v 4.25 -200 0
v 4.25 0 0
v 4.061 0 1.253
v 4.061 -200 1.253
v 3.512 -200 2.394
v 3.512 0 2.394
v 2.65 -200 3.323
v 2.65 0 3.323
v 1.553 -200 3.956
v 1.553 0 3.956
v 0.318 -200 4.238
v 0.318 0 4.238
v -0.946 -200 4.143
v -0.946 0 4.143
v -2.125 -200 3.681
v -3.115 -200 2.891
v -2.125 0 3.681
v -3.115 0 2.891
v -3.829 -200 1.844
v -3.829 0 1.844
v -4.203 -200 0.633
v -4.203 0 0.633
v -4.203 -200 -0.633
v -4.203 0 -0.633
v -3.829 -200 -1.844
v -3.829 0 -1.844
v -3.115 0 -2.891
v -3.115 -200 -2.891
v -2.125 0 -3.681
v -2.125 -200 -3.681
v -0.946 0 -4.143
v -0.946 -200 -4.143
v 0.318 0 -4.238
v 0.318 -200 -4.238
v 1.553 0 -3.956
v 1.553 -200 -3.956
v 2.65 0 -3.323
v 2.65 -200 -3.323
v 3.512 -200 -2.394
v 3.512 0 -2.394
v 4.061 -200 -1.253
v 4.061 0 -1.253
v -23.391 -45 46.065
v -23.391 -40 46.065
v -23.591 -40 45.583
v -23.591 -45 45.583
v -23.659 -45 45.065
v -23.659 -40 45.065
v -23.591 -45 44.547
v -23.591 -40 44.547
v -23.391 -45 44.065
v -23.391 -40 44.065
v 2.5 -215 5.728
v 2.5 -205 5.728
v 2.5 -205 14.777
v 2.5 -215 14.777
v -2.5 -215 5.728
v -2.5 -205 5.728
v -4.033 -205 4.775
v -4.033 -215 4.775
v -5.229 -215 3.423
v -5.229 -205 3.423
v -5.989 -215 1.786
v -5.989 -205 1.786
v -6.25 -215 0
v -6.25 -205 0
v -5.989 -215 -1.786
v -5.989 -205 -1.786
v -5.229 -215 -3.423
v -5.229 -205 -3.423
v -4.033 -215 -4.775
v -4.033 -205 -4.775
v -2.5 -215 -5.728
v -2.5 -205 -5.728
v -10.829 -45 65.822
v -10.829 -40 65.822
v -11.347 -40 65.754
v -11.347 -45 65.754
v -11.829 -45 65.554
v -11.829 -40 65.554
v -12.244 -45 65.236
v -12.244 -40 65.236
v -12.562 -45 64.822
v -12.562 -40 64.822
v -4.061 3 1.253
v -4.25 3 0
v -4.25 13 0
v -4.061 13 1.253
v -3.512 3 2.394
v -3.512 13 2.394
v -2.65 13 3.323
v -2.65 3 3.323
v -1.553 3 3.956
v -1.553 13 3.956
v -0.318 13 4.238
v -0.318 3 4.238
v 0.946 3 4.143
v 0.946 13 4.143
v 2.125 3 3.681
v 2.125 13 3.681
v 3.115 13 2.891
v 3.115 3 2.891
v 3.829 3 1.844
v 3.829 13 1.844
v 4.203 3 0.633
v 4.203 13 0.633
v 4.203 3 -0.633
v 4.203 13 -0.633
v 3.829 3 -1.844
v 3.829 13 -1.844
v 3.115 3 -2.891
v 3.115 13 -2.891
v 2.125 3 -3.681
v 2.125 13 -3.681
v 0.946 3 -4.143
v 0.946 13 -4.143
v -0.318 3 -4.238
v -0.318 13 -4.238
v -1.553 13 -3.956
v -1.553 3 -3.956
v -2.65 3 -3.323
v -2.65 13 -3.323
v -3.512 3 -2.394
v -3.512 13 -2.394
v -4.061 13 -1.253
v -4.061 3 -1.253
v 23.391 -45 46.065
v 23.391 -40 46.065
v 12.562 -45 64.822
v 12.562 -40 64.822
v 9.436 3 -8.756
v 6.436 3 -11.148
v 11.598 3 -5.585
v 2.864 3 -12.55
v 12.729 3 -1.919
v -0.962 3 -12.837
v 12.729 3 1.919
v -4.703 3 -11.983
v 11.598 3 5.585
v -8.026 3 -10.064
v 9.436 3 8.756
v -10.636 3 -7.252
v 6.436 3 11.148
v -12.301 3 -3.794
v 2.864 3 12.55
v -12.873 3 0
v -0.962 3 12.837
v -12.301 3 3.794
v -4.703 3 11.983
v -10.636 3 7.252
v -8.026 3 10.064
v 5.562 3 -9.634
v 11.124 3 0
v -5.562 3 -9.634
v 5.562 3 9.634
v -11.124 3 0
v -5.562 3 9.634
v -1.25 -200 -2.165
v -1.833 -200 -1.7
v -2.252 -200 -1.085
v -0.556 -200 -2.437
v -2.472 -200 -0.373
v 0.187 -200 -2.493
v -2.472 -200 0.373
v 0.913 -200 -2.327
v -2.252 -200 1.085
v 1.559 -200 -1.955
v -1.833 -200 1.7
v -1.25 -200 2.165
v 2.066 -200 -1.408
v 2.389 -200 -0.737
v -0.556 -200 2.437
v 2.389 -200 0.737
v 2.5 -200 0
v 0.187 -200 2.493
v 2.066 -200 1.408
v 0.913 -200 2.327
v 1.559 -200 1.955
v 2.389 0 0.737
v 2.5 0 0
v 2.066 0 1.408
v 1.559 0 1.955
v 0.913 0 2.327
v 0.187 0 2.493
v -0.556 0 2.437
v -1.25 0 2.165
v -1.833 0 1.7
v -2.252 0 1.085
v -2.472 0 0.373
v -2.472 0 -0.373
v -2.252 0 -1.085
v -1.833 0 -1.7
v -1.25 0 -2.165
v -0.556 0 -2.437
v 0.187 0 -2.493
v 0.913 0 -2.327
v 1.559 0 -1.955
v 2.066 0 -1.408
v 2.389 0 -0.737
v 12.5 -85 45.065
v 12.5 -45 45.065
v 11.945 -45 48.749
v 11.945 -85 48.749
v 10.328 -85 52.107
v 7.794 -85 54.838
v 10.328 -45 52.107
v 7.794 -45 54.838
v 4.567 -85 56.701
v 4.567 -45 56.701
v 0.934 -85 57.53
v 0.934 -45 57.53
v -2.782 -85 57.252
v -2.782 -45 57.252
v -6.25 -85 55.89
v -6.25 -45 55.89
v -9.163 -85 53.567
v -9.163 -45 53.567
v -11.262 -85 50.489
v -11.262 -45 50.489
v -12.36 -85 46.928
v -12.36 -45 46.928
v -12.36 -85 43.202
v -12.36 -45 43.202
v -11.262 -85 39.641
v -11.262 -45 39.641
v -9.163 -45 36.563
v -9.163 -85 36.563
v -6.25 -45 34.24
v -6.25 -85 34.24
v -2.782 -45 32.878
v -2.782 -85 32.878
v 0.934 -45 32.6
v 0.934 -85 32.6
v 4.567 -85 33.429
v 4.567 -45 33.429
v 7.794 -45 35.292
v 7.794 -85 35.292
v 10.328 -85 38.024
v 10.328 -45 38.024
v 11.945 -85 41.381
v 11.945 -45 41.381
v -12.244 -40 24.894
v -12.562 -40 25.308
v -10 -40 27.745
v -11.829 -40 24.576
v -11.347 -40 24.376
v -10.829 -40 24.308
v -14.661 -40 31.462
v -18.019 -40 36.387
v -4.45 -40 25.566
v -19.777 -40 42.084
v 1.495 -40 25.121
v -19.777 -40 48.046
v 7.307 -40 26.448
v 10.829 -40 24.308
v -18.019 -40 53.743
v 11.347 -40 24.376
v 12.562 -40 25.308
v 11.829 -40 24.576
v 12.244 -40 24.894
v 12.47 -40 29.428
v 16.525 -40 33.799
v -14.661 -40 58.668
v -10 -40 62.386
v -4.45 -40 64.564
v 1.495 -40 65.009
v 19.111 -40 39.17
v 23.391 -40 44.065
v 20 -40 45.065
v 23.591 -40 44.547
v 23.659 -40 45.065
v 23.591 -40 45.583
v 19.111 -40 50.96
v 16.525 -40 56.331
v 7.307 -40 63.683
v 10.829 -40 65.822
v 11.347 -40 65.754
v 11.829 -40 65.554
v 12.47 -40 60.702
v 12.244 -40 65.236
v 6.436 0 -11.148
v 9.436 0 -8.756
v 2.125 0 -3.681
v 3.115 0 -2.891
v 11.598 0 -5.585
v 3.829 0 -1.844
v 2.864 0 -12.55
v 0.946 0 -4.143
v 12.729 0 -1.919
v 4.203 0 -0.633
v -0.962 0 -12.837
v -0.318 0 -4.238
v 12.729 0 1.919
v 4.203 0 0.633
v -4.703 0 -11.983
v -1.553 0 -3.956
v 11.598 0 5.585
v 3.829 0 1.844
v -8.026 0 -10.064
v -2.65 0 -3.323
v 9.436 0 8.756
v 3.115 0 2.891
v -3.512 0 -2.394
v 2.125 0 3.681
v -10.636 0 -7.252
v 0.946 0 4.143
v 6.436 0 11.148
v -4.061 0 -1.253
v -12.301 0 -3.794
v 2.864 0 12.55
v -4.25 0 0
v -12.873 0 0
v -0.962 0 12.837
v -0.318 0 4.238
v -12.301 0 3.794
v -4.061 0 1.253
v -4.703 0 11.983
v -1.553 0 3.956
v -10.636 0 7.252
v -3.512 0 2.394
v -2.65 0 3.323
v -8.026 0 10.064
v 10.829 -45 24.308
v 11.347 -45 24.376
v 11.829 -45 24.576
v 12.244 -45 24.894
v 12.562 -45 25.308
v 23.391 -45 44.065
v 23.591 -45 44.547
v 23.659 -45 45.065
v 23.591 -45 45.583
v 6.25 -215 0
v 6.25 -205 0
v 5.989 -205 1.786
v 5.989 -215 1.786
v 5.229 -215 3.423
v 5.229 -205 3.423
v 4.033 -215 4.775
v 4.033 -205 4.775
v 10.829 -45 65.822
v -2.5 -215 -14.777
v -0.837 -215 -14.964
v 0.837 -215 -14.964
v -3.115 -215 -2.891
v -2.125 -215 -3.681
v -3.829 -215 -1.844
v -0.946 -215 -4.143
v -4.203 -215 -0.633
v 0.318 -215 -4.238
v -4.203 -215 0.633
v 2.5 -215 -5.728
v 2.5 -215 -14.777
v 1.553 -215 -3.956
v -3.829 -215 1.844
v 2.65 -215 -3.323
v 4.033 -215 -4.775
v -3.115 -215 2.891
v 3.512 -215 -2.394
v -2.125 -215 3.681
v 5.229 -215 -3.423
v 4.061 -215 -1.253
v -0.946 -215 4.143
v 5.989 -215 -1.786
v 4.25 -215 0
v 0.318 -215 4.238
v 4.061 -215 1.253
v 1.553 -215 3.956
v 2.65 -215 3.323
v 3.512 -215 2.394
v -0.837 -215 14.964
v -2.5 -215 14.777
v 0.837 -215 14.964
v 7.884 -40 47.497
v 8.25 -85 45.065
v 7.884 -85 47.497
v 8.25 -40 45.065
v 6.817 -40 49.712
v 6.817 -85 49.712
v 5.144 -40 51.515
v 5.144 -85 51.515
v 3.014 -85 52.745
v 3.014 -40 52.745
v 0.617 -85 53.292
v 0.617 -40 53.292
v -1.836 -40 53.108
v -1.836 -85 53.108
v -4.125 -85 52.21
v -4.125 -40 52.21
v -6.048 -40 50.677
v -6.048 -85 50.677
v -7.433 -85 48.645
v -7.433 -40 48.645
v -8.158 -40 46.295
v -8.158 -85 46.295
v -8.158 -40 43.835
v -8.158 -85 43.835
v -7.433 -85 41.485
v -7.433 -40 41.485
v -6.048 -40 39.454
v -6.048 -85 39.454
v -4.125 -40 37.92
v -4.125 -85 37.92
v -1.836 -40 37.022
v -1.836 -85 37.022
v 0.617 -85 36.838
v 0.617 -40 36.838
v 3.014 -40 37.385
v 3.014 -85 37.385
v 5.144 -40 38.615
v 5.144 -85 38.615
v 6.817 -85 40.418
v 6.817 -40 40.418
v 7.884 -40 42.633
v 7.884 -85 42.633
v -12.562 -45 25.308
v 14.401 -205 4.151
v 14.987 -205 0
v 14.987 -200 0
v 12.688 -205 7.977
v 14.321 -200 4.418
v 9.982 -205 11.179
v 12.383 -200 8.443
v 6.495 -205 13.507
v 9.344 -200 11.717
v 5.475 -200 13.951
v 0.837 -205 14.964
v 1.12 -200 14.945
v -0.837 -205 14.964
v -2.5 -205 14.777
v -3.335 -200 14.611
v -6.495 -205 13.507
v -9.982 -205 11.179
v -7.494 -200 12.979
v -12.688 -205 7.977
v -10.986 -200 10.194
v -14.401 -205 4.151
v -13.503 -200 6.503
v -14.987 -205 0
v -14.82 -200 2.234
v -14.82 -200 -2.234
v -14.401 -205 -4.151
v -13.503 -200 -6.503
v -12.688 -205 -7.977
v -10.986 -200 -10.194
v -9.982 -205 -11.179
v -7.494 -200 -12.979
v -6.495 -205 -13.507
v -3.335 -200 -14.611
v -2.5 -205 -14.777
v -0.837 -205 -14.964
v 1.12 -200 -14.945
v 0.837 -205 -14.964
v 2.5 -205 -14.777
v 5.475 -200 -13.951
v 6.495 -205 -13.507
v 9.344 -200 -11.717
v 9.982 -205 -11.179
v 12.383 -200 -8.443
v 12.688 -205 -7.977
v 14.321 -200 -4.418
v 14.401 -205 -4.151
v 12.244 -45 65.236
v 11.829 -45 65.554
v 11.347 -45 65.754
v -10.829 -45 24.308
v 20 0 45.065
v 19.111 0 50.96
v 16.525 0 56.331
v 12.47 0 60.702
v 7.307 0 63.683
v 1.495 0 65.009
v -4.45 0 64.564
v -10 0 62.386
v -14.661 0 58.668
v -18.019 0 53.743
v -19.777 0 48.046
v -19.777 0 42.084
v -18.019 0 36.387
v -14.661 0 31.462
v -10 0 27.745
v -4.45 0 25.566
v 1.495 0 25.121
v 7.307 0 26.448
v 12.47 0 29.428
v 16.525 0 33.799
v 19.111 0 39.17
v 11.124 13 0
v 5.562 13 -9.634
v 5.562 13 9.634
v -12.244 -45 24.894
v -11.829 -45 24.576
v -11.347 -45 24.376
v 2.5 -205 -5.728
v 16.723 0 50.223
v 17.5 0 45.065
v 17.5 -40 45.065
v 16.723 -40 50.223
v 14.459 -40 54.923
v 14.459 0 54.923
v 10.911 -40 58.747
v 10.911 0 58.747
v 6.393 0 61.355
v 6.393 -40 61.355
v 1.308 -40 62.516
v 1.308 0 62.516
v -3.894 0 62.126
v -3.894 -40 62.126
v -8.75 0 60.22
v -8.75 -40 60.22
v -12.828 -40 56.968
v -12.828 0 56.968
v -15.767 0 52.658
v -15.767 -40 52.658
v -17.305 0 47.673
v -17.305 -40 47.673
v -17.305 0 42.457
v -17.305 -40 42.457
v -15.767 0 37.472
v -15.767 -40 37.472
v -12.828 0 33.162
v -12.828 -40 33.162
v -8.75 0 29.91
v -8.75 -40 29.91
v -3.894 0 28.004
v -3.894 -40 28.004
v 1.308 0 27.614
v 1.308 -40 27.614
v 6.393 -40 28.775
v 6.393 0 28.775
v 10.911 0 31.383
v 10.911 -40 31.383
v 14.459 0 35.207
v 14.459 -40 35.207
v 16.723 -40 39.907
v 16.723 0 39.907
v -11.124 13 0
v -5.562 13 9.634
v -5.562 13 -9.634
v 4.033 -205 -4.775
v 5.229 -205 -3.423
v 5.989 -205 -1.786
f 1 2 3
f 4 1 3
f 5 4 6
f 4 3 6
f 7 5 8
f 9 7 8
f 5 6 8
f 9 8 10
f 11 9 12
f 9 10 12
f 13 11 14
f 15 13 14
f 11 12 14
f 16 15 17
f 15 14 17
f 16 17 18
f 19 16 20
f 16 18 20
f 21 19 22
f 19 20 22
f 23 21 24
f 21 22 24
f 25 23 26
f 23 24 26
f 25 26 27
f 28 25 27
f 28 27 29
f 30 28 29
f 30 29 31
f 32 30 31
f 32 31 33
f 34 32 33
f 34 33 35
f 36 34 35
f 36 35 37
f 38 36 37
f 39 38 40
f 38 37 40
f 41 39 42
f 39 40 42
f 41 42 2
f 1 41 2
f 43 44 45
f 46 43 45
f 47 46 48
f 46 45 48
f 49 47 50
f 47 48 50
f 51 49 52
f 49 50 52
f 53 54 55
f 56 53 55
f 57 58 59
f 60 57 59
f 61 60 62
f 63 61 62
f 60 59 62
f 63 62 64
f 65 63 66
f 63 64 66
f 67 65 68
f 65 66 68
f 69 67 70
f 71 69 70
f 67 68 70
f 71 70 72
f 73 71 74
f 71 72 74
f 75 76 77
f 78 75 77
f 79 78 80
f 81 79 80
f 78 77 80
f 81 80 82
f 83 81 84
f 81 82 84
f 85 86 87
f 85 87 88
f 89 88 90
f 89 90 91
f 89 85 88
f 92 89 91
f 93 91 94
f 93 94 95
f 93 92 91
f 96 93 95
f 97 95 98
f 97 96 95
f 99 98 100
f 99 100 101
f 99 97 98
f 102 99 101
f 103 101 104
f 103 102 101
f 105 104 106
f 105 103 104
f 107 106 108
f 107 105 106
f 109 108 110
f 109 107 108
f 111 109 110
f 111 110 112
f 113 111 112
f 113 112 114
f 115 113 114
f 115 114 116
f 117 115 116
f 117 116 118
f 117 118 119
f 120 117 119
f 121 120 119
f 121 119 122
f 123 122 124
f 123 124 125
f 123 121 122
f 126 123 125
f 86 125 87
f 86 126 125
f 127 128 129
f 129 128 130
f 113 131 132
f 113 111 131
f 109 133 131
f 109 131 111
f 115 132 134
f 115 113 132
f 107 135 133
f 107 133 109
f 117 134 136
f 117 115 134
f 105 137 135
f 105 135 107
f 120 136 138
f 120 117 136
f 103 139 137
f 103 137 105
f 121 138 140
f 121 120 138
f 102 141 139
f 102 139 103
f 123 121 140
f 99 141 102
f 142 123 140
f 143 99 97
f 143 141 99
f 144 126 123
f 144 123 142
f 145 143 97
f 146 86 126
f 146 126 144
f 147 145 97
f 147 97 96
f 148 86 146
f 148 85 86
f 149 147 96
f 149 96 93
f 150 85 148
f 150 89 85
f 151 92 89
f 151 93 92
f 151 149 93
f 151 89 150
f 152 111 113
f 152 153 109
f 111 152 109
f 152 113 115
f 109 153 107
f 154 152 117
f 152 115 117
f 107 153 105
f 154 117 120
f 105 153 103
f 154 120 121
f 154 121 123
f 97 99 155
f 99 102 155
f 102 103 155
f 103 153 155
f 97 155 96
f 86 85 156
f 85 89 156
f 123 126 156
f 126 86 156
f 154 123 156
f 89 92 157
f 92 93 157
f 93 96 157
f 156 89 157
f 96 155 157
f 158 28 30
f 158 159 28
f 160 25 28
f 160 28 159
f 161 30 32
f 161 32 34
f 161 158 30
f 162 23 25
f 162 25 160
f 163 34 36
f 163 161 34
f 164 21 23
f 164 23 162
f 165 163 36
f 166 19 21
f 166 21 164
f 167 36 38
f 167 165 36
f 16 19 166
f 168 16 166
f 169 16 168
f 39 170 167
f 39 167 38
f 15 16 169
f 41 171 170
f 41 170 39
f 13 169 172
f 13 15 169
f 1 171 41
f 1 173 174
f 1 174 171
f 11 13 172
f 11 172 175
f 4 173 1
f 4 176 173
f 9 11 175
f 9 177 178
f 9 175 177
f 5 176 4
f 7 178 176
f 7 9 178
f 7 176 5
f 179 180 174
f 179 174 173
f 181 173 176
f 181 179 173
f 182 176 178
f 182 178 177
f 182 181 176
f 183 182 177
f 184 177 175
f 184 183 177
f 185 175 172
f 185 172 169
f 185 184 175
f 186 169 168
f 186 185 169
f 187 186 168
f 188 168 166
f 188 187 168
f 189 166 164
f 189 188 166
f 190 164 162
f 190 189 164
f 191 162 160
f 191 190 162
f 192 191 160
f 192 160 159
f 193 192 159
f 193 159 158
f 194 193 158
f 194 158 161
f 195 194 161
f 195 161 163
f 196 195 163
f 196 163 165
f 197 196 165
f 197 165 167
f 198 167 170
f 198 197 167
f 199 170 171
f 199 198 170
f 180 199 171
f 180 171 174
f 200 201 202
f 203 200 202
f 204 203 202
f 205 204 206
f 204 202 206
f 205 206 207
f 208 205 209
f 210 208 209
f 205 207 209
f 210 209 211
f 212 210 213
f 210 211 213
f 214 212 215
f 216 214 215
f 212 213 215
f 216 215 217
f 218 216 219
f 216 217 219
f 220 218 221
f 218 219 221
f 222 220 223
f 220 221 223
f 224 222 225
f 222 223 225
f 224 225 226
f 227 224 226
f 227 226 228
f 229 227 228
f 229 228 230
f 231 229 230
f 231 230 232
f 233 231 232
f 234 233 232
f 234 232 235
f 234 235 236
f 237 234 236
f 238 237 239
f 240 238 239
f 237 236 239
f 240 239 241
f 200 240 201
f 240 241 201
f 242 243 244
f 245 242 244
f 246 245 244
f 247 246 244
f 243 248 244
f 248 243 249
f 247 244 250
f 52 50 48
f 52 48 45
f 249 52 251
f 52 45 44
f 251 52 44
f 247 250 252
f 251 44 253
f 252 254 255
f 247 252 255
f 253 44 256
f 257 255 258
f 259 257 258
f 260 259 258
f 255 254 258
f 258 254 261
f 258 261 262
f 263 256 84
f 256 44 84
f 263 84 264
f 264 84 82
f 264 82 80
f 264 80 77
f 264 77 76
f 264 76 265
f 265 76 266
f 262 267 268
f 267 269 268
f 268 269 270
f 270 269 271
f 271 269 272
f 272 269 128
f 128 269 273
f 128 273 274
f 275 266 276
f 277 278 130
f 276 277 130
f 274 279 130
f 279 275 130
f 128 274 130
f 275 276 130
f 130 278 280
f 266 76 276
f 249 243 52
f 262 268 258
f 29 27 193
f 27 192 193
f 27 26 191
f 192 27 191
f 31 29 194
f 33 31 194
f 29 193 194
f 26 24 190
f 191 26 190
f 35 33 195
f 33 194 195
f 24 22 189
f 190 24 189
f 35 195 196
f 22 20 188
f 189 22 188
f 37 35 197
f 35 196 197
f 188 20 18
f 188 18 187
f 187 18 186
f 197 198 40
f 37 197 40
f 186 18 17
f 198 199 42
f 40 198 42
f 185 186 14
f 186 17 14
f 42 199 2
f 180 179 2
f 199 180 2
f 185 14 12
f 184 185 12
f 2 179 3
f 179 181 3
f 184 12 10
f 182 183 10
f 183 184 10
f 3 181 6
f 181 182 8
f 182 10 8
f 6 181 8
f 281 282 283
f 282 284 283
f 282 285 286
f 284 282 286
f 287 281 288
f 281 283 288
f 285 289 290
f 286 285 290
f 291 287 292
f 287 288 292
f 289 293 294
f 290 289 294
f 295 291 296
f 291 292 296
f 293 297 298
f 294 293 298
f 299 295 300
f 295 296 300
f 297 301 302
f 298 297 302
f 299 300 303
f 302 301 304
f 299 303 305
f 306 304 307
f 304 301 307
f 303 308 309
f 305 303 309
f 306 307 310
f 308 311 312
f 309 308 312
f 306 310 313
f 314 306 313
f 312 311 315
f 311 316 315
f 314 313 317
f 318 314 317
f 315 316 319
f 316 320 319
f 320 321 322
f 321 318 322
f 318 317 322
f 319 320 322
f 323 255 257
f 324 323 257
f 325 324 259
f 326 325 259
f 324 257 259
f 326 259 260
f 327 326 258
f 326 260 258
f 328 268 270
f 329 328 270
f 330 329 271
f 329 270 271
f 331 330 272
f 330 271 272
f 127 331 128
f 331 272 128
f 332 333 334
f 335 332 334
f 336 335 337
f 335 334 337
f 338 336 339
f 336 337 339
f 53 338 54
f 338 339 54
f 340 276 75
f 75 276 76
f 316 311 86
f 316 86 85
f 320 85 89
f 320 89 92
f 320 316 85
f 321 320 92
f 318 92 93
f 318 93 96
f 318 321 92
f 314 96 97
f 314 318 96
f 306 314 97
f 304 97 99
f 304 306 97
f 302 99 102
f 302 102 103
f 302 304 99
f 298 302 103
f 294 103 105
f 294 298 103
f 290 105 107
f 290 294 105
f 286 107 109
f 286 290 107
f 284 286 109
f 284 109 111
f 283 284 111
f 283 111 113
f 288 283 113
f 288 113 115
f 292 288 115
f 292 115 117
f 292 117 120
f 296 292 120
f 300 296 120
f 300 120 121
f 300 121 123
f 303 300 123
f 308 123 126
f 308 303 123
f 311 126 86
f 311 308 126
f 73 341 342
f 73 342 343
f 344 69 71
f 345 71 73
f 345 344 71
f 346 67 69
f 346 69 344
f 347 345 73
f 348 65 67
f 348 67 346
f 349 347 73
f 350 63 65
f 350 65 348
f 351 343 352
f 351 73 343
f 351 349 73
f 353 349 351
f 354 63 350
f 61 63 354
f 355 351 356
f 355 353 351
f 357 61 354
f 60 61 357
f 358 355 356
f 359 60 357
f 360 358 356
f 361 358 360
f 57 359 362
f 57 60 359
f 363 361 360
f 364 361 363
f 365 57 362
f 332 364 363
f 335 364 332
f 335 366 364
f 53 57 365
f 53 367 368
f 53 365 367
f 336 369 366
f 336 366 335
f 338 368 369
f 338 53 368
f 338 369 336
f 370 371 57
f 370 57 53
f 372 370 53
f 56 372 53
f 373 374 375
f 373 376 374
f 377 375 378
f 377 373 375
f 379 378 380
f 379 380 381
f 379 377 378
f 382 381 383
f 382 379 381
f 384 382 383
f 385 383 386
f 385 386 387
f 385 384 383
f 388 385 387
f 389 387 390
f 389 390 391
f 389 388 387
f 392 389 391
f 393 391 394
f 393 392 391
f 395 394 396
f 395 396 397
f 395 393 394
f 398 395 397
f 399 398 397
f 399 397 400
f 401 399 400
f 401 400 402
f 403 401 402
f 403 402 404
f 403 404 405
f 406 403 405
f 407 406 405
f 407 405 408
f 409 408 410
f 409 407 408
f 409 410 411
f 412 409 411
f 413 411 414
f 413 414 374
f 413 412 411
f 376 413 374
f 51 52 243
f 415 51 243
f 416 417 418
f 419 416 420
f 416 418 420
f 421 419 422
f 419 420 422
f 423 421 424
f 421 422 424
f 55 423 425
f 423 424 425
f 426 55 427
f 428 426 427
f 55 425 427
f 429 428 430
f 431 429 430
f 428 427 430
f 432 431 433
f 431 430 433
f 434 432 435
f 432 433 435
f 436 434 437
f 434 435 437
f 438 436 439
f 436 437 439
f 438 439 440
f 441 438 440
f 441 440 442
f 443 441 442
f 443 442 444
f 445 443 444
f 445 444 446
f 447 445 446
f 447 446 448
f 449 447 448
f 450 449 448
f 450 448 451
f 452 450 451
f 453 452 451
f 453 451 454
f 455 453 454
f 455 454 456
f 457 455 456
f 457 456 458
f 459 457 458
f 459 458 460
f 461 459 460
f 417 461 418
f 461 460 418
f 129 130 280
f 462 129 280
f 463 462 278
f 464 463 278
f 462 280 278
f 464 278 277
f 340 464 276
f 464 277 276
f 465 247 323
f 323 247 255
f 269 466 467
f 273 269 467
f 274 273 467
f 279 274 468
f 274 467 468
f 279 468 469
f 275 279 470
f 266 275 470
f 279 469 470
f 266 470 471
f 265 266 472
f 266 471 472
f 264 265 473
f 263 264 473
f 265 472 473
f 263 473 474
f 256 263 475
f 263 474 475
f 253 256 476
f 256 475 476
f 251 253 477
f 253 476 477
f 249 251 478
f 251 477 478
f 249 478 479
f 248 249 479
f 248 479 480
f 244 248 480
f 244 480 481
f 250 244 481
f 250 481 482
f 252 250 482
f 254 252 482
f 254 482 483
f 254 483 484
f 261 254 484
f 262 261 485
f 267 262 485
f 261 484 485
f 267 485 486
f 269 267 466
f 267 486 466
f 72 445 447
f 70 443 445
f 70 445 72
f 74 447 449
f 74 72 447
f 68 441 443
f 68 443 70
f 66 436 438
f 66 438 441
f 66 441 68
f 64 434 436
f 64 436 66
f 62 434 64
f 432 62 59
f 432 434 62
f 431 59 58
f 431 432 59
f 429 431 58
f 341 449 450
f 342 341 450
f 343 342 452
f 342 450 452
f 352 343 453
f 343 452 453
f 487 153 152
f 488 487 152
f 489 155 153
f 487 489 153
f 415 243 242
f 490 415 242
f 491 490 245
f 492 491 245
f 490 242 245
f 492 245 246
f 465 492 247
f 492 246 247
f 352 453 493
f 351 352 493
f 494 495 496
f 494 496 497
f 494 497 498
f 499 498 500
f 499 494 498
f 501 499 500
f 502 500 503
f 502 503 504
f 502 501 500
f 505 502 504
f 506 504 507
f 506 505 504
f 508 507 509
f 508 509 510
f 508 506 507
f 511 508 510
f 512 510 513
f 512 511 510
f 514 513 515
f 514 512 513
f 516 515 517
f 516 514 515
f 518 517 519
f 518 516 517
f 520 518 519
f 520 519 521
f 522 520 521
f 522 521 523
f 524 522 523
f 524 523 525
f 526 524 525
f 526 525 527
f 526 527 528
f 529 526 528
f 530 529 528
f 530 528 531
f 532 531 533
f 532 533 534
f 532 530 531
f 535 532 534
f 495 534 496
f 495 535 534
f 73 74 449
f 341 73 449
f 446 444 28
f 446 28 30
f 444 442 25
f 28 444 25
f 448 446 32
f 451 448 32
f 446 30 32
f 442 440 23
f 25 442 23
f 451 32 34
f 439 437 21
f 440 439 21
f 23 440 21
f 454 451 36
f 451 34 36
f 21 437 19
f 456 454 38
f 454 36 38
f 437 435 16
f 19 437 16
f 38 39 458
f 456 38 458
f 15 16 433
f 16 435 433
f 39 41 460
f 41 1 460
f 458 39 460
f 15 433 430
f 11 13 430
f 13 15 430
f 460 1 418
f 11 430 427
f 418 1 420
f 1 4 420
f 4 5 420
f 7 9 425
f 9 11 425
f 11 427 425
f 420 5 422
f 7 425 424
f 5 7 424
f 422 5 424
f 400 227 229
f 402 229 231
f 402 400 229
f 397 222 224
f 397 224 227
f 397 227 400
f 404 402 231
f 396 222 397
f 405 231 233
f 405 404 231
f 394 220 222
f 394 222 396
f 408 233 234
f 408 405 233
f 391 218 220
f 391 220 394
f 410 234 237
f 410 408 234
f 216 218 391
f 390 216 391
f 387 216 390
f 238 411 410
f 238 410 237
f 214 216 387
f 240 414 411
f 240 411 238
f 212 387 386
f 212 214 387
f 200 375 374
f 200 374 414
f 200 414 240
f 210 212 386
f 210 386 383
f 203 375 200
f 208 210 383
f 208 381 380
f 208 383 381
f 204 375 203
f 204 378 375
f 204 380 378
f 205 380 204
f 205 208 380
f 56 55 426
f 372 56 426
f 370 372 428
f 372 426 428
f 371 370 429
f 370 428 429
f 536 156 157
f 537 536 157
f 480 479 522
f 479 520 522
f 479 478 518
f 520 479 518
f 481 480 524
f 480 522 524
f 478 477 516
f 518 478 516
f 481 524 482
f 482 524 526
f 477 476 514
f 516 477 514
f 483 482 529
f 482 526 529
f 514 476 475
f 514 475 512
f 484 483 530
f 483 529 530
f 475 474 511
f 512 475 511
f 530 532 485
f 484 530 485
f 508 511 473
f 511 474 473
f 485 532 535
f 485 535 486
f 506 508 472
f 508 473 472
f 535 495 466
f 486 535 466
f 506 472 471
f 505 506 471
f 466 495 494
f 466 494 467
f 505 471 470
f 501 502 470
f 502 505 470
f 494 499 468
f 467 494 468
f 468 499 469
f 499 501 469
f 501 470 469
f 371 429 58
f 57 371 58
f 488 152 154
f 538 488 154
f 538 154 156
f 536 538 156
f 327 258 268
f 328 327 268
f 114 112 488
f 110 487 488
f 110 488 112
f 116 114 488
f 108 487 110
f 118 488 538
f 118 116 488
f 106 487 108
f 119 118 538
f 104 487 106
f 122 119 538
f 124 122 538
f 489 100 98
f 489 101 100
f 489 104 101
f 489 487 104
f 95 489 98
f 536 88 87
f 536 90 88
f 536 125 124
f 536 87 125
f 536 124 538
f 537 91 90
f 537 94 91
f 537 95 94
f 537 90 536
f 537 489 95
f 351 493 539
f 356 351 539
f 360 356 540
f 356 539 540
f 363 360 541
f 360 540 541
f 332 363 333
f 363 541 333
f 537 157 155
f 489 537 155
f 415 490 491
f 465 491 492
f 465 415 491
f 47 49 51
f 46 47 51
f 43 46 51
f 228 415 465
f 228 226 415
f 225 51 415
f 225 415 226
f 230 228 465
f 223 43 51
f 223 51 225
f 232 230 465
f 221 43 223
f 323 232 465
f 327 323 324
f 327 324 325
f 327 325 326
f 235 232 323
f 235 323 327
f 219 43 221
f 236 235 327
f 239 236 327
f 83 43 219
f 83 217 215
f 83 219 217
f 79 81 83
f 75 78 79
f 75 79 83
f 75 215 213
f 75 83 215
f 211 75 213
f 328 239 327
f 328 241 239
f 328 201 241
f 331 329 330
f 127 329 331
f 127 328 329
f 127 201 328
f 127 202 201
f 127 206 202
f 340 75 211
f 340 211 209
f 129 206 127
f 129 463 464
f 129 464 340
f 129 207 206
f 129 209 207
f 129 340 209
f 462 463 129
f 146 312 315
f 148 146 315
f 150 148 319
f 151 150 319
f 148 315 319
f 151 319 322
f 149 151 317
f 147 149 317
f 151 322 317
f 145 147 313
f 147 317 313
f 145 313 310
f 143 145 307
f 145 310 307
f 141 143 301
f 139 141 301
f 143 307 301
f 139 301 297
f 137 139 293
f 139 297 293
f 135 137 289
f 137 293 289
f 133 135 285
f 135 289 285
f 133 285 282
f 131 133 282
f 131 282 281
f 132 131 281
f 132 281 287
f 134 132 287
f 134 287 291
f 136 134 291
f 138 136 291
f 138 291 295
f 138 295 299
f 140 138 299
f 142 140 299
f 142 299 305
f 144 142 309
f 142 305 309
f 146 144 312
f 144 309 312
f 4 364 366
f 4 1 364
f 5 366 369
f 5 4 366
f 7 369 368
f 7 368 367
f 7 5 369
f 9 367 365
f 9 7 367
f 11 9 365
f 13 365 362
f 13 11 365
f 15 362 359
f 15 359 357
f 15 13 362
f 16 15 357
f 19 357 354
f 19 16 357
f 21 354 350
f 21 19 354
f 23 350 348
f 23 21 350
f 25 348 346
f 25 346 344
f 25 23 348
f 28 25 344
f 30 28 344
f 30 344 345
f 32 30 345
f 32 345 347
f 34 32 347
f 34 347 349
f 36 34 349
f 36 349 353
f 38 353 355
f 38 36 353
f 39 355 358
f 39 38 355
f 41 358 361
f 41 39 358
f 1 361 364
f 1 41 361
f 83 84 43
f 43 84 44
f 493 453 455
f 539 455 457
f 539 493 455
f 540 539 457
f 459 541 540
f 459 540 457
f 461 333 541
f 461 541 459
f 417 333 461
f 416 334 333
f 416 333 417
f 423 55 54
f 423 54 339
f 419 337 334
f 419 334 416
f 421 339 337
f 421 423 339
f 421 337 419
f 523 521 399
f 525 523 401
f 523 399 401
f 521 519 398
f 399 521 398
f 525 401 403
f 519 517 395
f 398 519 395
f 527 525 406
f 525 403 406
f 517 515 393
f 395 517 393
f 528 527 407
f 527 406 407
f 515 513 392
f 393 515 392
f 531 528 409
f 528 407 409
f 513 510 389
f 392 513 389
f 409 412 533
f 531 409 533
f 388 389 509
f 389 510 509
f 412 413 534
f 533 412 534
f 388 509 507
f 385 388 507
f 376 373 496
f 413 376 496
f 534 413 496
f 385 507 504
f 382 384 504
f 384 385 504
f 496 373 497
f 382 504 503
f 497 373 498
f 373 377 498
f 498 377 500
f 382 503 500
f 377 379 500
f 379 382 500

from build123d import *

# Parameters (mm, degrees)
F0_R      = 4.25
F0_R_2    = 2.5
F1_DEPTH  = 200
F2_R      = 14.987167
F2_R_2    = 4.25
F3_DEPTH  = 5
F4_R      = 4.25
F5_DEPTH  = 10
F6_R      = 20
F6_R_2    = 17.5
F7_DEPTH  = 40
F8_R      = 8.250091
F9_DEPTH  = 5
F10_R     = 12.5
F10_R_2   = 8.250091
F11_DEPTH = 40
F12_R     = 12.872863
F12_R_2   = 4.25
F13_DEPTH = 3
F14_R     = 4.25
F15_DEPTH = 10


with BuildPart() as f1:
    # F0 (on Front) → F1 (new body)
    with BuildSketch(Plane.XZ):
        Circle(F0_R)
        Circle(F0_R_2, mode=Mode.SUBTRACT)
    extrude(amount=F1_DEPTH)


with BuildPart() as f3:
    # F2 (on face) → F3 (new body)
    with BuildSketch(Plane.XZ.offset(200)):
        Circle(F2_R)
        Circle(F2_R_2, mode=Mode.SUBTRACT)
    extrude(amount=F3_DEPTH)

    # F4 (on face) → F5 (join)
    with BuildSketch(Plane.XZ.offset(205)):
        with BuildLine():
            Line((2.5, 5.72822), (2.5, 14.777184))
            ThreePointArc((2.5, 14.777184), (0, 14.987167), (-2.5, 14.777184))
            Line((-2.5, 14.777184), (-2.5, 5.72822))
            ThreePointArc((-2.5, 5.72822), (0, 6.25), (2.5, 5.72822))
        make_face()
        with BuildLine():
            ThreePointArc((-2.5, -14.777184), (0, -14.987167), (2.5, -14.777184))
            Line((2.5, -14.777184), (2.5, -5.72822))
            ThreePointArc((2.5, -5.72822), (0, -6.25), (-2.5, -5.72822))
            Line((-2.5, -5.72822), (-2.5, -14.777184))
        make_face()
        with BuildLine():
            ThreePointArc((6.25, 0), (5.229125, 3.423266), (2.5, 5.72822))
            ThreePointArc((2.5, 5.72822), (0, 6.25), (-2.5, 5.72822))
            ThreePointArc((-2.5, 5.72822), (-6.25, 0), (-2.5, -5.72822))
            ThreePointArc((-2.5, -5.72822), (0, -6.25), (2.5, -5.72822))
            ThreePointArc((2.5, -5.72822), (5.229125, -3.423266), (6.25, 0))
        make_face()
        Circle(F4_R, mode=Mode.SUBTRACT)
    extrude(amount=F5_DEPTH)


with BuildPart() as f7:
    # F6 (on Front) → F7 (new body)
    with BuildSketch(Plane.XZ):
        with Locations((0, 45.065034)):
            Circle(F6_R)
        with Locations((0, 45.065034)):
            Circle(F6_R_2, mode=Mode.SUBTRACT)
    extrude(amount=F7_DEPTH)

    # F8 (on face) → F9 (join)
    with BuildSketch(Plane.XZ.offset(40)):
        with BuildLine():
            Line((10.829489, 65.822259), (-10.829489, 65.822259))
            ThreePointArc((-10.829489, 65.822259), (-11.829489, 65.554309), (-12.561539, 64.822259))
            Line((-12.561539, 64.822259), (-23.391028, 46.065034))
            ThreePointArc((-23.391028, 46.065034), (-23.658977, 45.065034), (-23.391028, 44.065034))
            Line((-23.391028, 44.065034), (-12.561539, 25.30781))
            ThreePointArc((-12.561539, 25.30781), (-11.829489, 24.575759), (-10.829489, 24.30781))
            Line((-10.829489, 24.30781), (10.829489, 24.30781))
            ThreePointArc((10.829489, 24.30781), (11.829489, 24.575759), (12.561539, 25.30781))
            Line((12.561539, 25.30781), (23.391028, 44.065034))
            ThreePointArc((23.391028, 44.065034), (23.658977, 45.065034), (23.391028, 46.065034))
            Line((23.391028, 46.065034), (12.561539, 64.822259))
            ThreePointArc((12.561539, 64.822259), (11.829489, 65.554309), (10.829489, 65.822259))
        make_face()
        with Locations((0, 45.065034)):
            Circle(F8_R, mode=Mode.SUBTRACT)
    extrude(amount=F9_DEPTH)

    # F10 (on face) → F11 (join)
    with BuildSketch(Plane.XZ.offset(45)):
        with Locations((0, 45.065034)):
            Circle(F10_R)
        with Locations((0, 45.065034)):
            Circle(F10_R_2, mode=Mode.SUBTRACT)
    extrude(amount=F11_DEPTH)


with BuildPart() as f13:
    # F12 (on face) → F13 (new body)
    with BuildSketch(Plane(origin=(0, 0, 0), x_dir=(-1, 0, 0), z_dir=(0, 1, 0))):
        Circle(F12_R)
        Circle(F12_R_2, mode=Mode.SUBTRACT)
    extrude(amount=F13_DEPTH)


with BuildPart() as f15:
    # F14 (on face) → F15 (new body)
    with BuildSketch(Plane(origin=(0, 3, 0), x_dir=(-1, 0, 0), z_dir=(0, 1, 0))):
        Polygon((5.562042, 9.633739), (-5.562042, 9.633739), (-11.124084, 0), (-5.562042, -9.633739), (5.562042, -9.633739), (11.124084, 0), align=None)
        Circle(F14_R, mode=Mode.SUBTRACT)
    extrude(amount=F15_DEPTH)


solid = Compound([f1.part, f3.part, f7.part, f13.part, f15.part])
